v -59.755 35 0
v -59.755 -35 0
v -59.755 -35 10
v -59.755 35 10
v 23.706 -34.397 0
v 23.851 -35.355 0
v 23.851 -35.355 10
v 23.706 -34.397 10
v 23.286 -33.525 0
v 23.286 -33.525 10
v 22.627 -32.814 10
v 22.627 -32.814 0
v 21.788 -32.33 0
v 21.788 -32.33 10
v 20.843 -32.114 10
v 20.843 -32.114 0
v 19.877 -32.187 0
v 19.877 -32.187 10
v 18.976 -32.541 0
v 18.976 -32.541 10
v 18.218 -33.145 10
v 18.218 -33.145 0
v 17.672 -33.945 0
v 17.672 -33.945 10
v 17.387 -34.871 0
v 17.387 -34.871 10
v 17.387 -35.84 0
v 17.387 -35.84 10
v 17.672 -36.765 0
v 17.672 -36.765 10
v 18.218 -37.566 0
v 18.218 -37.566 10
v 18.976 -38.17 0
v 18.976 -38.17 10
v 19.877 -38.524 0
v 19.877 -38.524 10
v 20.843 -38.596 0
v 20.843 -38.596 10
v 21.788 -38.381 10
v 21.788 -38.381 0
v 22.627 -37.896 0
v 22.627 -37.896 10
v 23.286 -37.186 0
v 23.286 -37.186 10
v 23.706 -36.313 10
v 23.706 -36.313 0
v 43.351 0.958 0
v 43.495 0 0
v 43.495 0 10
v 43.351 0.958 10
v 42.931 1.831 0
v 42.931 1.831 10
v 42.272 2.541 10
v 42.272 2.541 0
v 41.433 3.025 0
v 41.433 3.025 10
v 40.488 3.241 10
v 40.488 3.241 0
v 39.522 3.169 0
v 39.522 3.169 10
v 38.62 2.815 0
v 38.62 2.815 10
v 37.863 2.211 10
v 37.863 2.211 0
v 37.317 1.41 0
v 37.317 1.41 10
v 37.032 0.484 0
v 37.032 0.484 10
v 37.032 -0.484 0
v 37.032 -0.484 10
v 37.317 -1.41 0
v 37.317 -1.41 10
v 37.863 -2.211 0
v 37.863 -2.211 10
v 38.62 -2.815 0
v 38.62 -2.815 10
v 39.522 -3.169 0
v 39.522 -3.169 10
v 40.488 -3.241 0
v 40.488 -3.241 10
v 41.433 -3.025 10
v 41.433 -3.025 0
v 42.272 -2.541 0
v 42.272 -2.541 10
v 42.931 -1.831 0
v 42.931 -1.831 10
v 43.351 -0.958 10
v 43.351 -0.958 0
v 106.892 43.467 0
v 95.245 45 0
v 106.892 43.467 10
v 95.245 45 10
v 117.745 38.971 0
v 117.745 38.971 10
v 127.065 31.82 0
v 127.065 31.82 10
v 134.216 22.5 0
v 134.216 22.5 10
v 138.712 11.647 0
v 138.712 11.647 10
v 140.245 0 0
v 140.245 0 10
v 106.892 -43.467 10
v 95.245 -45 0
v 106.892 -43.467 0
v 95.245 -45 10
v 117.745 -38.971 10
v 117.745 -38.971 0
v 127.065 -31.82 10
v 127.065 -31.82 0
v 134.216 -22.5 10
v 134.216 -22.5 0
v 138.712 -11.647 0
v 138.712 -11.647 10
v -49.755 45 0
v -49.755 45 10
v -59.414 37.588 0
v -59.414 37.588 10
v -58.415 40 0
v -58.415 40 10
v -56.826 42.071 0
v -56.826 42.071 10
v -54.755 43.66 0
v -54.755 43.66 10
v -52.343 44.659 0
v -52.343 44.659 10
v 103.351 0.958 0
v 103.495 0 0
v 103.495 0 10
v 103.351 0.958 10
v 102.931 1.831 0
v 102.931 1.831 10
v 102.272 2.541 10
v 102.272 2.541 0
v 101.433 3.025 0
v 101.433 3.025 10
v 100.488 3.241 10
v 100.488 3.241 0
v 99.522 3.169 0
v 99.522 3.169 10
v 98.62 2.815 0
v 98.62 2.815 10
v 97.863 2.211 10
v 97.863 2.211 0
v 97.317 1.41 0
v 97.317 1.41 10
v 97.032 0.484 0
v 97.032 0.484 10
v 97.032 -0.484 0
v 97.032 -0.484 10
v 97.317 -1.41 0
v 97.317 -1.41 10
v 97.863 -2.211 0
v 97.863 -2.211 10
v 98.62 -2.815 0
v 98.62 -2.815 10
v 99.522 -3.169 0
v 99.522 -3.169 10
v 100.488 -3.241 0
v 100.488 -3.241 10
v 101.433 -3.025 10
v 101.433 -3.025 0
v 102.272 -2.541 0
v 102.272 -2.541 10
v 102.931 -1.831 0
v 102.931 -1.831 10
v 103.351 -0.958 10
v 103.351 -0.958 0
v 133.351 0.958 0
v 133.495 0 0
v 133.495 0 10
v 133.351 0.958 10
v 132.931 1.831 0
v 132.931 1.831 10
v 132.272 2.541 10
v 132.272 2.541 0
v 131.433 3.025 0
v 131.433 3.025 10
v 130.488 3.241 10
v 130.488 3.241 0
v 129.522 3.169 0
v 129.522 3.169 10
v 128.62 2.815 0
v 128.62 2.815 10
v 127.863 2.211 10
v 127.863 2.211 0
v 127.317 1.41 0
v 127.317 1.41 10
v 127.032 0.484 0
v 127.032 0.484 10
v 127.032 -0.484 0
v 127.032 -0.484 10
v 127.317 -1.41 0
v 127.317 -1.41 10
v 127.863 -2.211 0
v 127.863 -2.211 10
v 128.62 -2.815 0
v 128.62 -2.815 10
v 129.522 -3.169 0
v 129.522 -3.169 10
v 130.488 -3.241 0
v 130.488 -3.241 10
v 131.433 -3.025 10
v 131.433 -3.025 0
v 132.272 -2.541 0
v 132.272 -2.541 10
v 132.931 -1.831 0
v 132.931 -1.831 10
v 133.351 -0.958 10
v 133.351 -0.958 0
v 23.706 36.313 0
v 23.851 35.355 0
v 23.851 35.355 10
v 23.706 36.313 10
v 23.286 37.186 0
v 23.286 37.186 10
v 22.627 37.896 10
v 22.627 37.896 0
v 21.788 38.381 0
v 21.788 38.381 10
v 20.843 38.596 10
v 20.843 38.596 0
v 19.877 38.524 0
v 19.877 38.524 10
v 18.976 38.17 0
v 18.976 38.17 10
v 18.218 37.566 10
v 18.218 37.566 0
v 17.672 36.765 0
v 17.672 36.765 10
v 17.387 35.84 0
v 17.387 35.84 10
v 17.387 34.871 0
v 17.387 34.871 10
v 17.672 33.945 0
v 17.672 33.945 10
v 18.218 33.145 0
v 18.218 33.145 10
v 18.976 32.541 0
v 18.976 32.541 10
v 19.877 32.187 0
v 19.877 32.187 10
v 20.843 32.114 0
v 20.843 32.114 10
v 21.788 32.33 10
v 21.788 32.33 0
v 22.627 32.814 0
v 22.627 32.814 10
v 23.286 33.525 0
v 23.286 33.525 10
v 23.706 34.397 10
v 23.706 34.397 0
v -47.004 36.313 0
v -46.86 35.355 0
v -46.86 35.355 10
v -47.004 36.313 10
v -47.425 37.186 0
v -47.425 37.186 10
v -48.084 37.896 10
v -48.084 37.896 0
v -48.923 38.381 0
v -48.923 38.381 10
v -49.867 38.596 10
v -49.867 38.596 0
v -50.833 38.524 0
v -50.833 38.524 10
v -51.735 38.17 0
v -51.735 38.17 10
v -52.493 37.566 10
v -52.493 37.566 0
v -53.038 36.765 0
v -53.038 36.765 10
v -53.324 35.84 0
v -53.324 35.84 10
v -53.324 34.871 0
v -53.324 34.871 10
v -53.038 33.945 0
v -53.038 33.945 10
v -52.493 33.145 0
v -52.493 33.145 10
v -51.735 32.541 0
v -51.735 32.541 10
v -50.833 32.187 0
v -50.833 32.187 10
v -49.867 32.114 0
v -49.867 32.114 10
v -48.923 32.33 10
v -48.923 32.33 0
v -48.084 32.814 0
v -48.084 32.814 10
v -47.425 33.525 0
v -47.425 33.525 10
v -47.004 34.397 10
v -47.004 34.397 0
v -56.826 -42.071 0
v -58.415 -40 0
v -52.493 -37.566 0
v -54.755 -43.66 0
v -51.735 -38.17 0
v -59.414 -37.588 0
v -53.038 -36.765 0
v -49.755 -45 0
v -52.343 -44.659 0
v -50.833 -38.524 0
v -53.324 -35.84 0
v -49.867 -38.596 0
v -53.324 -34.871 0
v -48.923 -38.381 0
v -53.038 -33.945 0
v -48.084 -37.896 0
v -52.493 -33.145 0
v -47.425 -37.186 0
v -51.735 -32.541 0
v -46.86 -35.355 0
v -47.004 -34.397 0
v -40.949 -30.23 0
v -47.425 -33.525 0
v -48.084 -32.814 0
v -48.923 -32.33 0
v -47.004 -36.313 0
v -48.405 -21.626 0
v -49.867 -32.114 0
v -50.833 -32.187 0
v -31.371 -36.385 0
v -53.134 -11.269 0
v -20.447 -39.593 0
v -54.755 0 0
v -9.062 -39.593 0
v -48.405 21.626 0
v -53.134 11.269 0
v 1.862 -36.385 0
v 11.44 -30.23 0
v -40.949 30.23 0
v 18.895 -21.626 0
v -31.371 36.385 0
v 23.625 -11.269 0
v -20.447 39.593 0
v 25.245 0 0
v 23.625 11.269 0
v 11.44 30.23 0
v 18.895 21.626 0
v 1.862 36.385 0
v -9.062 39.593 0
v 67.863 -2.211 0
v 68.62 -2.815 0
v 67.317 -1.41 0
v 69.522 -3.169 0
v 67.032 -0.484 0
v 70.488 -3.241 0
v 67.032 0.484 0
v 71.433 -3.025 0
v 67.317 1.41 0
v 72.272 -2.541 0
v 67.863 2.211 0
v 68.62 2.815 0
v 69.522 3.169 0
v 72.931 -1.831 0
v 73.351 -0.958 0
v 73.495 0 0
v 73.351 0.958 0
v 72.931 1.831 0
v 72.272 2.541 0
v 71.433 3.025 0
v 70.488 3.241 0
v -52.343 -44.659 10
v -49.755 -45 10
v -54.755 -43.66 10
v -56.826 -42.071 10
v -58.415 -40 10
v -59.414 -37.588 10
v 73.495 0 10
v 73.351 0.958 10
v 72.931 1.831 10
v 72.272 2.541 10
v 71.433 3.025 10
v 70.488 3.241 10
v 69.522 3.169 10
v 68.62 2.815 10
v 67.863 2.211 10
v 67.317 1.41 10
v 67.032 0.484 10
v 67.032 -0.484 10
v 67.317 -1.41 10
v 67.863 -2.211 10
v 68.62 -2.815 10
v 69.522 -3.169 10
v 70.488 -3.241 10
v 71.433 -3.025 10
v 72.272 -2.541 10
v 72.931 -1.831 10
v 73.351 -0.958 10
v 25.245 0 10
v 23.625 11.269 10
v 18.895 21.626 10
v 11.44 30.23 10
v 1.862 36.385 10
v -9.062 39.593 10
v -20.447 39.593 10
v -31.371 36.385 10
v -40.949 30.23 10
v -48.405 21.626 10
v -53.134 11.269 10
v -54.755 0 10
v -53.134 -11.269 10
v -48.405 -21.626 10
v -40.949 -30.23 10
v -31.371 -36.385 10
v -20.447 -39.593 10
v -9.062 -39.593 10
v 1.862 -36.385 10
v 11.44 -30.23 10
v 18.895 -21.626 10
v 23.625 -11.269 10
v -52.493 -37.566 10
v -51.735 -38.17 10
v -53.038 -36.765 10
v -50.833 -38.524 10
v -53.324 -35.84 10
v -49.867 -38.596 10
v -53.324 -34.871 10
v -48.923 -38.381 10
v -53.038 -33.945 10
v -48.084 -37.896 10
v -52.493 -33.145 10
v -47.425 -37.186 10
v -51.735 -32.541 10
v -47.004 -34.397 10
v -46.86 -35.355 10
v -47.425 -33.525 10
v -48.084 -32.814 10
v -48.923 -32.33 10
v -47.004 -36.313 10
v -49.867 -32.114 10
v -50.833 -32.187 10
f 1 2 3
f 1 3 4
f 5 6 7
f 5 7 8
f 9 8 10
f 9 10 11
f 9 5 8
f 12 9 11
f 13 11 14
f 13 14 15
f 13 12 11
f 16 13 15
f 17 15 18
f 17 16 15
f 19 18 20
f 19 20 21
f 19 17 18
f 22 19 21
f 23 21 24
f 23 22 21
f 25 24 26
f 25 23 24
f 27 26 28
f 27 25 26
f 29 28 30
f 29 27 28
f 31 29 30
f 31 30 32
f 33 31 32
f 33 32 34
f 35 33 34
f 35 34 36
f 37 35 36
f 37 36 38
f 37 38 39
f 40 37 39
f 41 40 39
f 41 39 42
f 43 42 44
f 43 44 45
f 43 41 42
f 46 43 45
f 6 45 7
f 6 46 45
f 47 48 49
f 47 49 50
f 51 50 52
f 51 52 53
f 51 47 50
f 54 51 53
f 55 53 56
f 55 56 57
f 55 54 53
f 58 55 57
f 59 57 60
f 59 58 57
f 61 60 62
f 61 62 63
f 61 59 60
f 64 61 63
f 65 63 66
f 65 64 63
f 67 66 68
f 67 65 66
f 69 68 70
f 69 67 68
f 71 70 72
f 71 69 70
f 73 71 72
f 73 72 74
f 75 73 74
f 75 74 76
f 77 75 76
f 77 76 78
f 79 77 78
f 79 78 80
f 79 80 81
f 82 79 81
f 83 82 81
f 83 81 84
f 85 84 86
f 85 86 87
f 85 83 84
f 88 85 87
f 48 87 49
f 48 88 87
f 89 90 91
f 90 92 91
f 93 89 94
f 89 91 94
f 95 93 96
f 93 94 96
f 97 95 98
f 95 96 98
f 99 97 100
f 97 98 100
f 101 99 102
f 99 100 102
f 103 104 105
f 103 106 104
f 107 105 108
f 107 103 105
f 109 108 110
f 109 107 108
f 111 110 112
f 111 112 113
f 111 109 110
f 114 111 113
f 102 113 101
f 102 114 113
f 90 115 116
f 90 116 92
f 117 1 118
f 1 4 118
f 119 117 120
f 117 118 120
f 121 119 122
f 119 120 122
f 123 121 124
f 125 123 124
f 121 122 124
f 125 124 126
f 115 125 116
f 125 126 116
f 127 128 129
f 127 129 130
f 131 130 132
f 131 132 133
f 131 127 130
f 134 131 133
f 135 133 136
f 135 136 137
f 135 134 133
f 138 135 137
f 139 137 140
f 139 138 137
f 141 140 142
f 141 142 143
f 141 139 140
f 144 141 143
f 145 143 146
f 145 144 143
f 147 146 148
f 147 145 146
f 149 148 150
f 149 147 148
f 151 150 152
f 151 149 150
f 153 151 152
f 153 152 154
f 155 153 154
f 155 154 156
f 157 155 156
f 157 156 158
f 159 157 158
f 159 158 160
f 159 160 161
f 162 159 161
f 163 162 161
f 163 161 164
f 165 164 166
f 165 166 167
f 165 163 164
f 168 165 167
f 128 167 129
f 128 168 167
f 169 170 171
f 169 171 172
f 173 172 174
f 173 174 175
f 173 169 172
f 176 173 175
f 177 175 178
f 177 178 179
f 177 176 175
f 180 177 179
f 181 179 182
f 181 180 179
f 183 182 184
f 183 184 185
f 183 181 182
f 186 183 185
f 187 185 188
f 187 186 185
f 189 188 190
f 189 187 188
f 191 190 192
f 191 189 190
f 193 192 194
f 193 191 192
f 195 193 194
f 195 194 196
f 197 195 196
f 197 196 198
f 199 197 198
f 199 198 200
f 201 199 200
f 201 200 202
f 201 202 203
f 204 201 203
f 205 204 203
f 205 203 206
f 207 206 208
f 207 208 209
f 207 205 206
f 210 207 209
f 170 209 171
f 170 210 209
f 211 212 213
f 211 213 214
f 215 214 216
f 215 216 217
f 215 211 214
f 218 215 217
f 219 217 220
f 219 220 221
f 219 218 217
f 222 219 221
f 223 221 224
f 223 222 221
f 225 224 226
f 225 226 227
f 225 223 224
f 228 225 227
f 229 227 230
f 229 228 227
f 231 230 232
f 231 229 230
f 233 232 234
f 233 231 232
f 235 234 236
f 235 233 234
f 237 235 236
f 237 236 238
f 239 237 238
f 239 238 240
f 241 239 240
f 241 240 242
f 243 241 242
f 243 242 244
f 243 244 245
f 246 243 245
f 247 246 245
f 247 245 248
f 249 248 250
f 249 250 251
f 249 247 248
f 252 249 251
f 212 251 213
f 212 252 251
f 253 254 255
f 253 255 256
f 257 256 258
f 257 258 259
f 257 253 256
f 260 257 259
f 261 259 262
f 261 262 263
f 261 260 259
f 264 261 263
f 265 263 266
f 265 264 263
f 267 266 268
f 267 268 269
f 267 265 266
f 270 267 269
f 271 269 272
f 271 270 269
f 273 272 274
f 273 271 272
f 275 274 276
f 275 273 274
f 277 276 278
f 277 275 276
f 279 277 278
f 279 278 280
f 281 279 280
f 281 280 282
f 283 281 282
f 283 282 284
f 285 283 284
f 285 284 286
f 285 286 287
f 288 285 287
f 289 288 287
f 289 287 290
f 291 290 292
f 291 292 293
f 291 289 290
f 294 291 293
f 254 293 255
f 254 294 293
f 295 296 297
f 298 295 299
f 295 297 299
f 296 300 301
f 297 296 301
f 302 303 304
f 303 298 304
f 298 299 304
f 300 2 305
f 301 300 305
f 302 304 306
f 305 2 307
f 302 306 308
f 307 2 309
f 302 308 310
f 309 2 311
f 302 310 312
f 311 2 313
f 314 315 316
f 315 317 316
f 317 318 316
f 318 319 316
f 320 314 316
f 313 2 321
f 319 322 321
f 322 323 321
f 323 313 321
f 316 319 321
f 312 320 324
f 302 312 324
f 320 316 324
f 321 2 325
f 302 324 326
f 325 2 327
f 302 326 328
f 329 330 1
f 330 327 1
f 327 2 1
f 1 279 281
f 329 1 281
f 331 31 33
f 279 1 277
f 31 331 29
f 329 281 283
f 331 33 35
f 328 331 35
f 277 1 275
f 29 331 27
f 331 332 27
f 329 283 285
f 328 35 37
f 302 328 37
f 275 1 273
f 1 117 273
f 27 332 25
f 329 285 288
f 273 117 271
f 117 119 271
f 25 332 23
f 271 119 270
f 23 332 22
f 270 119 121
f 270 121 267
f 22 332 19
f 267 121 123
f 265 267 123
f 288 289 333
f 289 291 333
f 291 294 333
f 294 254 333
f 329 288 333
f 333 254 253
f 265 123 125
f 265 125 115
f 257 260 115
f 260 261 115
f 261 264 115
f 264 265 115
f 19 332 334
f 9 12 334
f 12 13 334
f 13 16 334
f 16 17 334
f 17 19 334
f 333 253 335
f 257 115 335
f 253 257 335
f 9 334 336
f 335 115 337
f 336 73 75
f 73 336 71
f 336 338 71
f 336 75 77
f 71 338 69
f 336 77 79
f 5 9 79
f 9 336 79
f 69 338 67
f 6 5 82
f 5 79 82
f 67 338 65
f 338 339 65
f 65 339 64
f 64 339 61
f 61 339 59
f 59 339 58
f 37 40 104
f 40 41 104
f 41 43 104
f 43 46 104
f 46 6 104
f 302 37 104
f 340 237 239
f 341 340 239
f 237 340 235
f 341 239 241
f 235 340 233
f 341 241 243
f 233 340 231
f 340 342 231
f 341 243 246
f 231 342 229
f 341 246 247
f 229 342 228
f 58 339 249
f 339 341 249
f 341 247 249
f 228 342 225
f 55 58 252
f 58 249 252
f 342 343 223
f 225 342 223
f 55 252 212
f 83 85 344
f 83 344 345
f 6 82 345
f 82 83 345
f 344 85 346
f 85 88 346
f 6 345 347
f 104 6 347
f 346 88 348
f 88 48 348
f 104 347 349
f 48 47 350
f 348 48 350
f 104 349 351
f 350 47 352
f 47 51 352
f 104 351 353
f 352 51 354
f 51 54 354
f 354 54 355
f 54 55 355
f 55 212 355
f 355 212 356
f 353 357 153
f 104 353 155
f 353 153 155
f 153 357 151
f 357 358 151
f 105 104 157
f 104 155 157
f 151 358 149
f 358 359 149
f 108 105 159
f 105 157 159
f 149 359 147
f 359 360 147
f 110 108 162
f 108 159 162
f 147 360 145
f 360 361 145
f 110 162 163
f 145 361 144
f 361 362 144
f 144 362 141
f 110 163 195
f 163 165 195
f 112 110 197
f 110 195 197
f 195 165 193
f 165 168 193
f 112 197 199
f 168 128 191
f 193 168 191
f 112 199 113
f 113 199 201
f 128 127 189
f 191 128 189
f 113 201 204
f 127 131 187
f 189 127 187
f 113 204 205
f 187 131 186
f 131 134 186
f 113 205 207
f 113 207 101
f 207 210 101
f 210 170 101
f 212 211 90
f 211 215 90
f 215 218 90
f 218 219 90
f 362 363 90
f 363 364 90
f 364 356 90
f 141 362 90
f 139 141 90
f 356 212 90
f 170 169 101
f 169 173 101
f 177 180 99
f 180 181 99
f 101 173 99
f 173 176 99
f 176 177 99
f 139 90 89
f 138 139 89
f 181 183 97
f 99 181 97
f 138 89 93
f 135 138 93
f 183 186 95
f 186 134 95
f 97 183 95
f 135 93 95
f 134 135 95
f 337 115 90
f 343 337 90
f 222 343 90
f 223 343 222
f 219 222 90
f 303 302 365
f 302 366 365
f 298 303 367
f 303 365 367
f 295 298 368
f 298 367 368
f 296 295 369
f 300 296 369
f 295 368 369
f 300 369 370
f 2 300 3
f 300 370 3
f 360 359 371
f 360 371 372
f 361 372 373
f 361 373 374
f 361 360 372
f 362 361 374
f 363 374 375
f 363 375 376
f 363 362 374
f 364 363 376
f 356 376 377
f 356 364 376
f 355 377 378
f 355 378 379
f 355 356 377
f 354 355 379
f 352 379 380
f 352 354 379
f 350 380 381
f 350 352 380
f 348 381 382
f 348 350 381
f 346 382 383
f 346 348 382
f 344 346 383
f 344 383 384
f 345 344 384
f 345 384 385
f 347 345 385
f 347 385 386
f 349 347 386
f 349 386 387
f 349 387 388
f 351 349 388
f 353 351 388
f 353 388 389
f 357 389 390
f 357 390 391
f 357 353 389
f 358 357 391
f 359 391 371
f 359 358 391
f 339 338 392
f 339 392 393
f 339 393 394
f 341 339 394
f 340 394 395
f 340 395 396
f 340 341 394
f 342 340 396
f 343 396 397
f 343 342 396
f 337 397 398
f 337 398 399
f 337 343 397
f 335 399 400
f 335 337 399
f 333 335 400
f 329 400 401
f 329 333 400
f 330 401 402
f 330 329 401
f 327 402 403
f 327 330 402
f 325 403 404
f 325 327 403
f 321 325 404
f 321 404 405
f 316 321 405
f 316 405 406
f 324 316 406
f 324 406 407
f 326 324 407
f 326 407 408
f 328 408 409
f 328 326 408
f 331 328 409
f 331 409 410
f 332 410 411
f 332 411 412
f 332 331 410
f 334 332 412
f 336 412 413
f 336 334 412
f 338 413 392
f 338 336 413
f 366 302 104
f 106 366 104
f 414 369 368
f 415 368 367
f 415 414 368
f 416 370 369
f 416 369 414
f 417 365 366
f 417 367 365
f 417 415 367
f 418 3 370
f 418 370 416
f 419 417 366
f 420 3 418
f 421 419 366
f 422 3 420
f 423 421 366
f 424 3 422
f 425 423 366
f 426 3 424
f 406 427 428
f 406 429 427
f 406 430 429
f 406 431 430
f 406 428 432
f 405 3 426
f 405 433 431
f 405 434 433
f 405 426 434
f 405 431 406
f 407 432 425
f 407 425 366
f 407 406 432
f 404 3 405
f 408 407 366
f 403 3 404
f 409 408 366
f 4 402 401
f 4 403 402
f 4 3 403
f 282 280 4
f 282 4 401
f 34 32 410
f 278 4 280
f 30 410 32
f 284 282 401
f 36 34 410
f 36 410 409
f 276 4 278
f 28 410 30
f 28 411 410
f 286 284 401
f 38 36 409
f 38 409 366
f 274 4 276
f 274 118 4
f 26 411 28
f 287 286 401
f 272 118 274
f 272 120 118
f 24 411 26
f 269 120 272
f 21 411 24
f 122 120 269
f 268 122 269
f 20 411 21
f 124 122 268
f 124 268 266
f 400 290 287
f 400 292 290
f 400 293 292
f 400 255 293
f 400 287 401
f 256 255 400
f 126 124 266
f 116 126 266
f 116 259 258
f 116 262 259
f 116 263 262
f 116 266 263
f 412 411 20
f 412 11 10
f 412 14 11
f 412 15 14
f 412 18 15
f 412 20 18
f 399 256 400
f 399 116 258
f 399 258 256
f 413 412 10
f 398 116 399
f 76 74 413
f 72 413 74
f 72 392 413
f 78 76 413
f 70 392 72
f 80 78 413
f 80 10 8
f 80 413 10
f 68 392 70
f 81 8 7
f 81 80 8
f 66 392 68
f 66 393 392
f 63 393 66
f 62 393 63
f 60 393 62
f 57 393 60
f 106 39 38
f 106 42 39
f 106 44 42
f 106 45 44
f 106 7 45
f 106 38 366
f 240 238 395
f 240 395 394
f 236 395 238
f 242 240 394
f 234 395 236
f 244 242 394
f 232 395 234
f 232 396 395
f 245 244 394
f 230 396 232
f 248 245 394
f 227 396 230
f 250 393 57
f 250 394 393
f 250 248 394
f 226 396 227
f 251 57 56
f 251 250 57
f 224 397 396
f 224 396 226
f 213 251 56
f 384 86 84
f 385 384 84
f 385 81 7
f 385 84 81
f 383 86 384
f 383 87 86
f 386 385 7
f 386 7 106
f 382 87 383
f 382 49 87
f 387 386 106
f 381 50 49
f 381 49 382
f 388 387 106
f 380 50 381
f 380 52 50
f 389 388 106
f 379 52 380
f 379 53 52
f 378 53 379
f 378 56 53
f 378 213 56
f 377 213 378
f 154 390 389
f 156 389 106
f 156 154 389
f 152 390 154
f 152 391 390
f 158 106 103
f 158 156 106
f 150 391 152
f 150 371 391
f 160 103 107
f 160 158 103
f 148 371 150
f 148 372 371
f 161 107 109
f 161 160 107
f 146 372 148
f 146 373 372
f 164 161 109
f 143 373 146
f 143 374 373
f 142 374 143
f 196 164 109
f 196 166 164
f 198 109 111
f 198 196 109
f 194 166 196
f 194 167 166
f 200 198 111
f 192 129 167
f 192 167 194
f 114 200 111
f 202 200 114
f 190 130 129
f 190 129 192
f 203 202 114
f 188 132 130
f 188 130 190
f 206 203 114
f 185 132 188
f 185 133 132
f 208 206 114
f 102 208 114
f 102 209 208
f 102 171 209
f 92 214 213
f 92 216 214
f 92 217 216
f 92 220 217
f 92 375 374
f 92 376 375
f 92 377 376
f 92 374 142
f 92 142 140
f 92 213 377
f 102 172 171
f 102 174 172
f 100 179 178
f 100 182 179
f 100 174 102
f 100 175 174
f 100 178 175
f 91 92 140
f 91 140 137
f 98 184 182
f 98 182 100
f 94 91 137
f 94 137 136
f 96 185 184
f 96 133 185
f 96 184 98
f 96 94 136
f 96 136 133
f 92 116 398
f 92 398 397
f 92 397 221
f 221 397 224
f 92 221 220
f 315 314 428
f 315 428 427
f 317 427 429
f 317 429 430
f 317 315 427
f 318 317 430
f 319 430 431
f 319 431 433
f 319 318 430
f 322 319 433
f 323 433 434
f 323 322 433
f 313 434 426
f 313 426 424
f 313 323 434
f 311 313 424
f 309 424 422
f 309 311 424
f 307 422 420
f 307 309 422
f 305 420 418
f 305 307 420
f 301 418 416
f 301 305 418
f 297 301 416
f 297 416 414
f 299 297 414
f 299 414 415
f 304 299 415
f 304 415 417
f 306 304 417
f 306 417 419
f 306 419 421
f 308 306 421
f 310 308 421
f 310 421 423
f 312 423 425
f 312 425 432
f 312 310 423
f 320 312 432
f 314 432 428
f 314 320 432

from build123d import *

# Parameters (mm, degrees)
SKETCH1_W           = 200
SKETCH1_H           = 90
SKETCH1_R           = 3.25
SKETCH1_R_2         = 40
BOSS_EXTRUDE1_DEPTH = 10
FILLET1_R           = 45
FILLET2_R           = 10


with BuildPart() as part:
    # Sketch1 → Boss-Extrude1 (new body)
    with BuildSketch(Plane.XY):
        with Locations((40.245231608, 0)):
            Rectangle(SKETCH1_W, SKETCH1_H)
        with Locations((-50.110107452, 35.355339059)):
            Circle(SKETCH1_R, mode=Mode.SUBTRACT)
        with Locations((20.600570667, 35.355339059)):
            Circle(SKETCH1_R, mode=Mode.SUBTRACT)
        with Locations((20.600570667, -35.355339059)):
            Circle(SKETCH1_R, mode=Mode.SUBTRACT)
        with Locations((-50.110107452, -35.355339059)):
            Circle(SKETCH1_R, mode=Mode.SUBTRACT)
        with Locations((-14.754768392, 0)):
            Circle(SKETCH1_R_2, mode=Mode.SUBTRACT)
        with Locations((40.245231608, 0)):
            Circle(SKETCH1_R, mode=Mode.SUBTRACT)
        with Locations((70.245231608, 0)):
            Circle(SKETCH1_R, mode=Mode.SUBTRACT)
        with Locations((100.245231608, 0)):
            Circle(SKETCH1_R, mode=Mode.SUBTRACT)
        with Locations((130.245231608, 0)):
            Circle(SKETCH1_R, mode=Mode.SUBTRACT)
    extrude(amount=BOSS_EXTRUDE1_DEPTH)

    # Fillet1
    fillet1_edges = [part.edges().sort_by_distance(p)[0] for p in [
        (140.245231608, -45, 5),
        (140.245231608, 45, 5),
    ]]
    fillet(fillet1_edges, radius=FILLET1_R - 0.0001)  # a hair under: the kernel refuses the full size

    # Fillet2
    fillet2_edges = [part.edges().sort_by_distance(p)[0] for p in [
        (-59.754768392, -45, 5),
        (-59.754768392, 45, 5),
    ]]
    fillet(fillet2_edges, radius=FILLET2_R)


solid = part.part
